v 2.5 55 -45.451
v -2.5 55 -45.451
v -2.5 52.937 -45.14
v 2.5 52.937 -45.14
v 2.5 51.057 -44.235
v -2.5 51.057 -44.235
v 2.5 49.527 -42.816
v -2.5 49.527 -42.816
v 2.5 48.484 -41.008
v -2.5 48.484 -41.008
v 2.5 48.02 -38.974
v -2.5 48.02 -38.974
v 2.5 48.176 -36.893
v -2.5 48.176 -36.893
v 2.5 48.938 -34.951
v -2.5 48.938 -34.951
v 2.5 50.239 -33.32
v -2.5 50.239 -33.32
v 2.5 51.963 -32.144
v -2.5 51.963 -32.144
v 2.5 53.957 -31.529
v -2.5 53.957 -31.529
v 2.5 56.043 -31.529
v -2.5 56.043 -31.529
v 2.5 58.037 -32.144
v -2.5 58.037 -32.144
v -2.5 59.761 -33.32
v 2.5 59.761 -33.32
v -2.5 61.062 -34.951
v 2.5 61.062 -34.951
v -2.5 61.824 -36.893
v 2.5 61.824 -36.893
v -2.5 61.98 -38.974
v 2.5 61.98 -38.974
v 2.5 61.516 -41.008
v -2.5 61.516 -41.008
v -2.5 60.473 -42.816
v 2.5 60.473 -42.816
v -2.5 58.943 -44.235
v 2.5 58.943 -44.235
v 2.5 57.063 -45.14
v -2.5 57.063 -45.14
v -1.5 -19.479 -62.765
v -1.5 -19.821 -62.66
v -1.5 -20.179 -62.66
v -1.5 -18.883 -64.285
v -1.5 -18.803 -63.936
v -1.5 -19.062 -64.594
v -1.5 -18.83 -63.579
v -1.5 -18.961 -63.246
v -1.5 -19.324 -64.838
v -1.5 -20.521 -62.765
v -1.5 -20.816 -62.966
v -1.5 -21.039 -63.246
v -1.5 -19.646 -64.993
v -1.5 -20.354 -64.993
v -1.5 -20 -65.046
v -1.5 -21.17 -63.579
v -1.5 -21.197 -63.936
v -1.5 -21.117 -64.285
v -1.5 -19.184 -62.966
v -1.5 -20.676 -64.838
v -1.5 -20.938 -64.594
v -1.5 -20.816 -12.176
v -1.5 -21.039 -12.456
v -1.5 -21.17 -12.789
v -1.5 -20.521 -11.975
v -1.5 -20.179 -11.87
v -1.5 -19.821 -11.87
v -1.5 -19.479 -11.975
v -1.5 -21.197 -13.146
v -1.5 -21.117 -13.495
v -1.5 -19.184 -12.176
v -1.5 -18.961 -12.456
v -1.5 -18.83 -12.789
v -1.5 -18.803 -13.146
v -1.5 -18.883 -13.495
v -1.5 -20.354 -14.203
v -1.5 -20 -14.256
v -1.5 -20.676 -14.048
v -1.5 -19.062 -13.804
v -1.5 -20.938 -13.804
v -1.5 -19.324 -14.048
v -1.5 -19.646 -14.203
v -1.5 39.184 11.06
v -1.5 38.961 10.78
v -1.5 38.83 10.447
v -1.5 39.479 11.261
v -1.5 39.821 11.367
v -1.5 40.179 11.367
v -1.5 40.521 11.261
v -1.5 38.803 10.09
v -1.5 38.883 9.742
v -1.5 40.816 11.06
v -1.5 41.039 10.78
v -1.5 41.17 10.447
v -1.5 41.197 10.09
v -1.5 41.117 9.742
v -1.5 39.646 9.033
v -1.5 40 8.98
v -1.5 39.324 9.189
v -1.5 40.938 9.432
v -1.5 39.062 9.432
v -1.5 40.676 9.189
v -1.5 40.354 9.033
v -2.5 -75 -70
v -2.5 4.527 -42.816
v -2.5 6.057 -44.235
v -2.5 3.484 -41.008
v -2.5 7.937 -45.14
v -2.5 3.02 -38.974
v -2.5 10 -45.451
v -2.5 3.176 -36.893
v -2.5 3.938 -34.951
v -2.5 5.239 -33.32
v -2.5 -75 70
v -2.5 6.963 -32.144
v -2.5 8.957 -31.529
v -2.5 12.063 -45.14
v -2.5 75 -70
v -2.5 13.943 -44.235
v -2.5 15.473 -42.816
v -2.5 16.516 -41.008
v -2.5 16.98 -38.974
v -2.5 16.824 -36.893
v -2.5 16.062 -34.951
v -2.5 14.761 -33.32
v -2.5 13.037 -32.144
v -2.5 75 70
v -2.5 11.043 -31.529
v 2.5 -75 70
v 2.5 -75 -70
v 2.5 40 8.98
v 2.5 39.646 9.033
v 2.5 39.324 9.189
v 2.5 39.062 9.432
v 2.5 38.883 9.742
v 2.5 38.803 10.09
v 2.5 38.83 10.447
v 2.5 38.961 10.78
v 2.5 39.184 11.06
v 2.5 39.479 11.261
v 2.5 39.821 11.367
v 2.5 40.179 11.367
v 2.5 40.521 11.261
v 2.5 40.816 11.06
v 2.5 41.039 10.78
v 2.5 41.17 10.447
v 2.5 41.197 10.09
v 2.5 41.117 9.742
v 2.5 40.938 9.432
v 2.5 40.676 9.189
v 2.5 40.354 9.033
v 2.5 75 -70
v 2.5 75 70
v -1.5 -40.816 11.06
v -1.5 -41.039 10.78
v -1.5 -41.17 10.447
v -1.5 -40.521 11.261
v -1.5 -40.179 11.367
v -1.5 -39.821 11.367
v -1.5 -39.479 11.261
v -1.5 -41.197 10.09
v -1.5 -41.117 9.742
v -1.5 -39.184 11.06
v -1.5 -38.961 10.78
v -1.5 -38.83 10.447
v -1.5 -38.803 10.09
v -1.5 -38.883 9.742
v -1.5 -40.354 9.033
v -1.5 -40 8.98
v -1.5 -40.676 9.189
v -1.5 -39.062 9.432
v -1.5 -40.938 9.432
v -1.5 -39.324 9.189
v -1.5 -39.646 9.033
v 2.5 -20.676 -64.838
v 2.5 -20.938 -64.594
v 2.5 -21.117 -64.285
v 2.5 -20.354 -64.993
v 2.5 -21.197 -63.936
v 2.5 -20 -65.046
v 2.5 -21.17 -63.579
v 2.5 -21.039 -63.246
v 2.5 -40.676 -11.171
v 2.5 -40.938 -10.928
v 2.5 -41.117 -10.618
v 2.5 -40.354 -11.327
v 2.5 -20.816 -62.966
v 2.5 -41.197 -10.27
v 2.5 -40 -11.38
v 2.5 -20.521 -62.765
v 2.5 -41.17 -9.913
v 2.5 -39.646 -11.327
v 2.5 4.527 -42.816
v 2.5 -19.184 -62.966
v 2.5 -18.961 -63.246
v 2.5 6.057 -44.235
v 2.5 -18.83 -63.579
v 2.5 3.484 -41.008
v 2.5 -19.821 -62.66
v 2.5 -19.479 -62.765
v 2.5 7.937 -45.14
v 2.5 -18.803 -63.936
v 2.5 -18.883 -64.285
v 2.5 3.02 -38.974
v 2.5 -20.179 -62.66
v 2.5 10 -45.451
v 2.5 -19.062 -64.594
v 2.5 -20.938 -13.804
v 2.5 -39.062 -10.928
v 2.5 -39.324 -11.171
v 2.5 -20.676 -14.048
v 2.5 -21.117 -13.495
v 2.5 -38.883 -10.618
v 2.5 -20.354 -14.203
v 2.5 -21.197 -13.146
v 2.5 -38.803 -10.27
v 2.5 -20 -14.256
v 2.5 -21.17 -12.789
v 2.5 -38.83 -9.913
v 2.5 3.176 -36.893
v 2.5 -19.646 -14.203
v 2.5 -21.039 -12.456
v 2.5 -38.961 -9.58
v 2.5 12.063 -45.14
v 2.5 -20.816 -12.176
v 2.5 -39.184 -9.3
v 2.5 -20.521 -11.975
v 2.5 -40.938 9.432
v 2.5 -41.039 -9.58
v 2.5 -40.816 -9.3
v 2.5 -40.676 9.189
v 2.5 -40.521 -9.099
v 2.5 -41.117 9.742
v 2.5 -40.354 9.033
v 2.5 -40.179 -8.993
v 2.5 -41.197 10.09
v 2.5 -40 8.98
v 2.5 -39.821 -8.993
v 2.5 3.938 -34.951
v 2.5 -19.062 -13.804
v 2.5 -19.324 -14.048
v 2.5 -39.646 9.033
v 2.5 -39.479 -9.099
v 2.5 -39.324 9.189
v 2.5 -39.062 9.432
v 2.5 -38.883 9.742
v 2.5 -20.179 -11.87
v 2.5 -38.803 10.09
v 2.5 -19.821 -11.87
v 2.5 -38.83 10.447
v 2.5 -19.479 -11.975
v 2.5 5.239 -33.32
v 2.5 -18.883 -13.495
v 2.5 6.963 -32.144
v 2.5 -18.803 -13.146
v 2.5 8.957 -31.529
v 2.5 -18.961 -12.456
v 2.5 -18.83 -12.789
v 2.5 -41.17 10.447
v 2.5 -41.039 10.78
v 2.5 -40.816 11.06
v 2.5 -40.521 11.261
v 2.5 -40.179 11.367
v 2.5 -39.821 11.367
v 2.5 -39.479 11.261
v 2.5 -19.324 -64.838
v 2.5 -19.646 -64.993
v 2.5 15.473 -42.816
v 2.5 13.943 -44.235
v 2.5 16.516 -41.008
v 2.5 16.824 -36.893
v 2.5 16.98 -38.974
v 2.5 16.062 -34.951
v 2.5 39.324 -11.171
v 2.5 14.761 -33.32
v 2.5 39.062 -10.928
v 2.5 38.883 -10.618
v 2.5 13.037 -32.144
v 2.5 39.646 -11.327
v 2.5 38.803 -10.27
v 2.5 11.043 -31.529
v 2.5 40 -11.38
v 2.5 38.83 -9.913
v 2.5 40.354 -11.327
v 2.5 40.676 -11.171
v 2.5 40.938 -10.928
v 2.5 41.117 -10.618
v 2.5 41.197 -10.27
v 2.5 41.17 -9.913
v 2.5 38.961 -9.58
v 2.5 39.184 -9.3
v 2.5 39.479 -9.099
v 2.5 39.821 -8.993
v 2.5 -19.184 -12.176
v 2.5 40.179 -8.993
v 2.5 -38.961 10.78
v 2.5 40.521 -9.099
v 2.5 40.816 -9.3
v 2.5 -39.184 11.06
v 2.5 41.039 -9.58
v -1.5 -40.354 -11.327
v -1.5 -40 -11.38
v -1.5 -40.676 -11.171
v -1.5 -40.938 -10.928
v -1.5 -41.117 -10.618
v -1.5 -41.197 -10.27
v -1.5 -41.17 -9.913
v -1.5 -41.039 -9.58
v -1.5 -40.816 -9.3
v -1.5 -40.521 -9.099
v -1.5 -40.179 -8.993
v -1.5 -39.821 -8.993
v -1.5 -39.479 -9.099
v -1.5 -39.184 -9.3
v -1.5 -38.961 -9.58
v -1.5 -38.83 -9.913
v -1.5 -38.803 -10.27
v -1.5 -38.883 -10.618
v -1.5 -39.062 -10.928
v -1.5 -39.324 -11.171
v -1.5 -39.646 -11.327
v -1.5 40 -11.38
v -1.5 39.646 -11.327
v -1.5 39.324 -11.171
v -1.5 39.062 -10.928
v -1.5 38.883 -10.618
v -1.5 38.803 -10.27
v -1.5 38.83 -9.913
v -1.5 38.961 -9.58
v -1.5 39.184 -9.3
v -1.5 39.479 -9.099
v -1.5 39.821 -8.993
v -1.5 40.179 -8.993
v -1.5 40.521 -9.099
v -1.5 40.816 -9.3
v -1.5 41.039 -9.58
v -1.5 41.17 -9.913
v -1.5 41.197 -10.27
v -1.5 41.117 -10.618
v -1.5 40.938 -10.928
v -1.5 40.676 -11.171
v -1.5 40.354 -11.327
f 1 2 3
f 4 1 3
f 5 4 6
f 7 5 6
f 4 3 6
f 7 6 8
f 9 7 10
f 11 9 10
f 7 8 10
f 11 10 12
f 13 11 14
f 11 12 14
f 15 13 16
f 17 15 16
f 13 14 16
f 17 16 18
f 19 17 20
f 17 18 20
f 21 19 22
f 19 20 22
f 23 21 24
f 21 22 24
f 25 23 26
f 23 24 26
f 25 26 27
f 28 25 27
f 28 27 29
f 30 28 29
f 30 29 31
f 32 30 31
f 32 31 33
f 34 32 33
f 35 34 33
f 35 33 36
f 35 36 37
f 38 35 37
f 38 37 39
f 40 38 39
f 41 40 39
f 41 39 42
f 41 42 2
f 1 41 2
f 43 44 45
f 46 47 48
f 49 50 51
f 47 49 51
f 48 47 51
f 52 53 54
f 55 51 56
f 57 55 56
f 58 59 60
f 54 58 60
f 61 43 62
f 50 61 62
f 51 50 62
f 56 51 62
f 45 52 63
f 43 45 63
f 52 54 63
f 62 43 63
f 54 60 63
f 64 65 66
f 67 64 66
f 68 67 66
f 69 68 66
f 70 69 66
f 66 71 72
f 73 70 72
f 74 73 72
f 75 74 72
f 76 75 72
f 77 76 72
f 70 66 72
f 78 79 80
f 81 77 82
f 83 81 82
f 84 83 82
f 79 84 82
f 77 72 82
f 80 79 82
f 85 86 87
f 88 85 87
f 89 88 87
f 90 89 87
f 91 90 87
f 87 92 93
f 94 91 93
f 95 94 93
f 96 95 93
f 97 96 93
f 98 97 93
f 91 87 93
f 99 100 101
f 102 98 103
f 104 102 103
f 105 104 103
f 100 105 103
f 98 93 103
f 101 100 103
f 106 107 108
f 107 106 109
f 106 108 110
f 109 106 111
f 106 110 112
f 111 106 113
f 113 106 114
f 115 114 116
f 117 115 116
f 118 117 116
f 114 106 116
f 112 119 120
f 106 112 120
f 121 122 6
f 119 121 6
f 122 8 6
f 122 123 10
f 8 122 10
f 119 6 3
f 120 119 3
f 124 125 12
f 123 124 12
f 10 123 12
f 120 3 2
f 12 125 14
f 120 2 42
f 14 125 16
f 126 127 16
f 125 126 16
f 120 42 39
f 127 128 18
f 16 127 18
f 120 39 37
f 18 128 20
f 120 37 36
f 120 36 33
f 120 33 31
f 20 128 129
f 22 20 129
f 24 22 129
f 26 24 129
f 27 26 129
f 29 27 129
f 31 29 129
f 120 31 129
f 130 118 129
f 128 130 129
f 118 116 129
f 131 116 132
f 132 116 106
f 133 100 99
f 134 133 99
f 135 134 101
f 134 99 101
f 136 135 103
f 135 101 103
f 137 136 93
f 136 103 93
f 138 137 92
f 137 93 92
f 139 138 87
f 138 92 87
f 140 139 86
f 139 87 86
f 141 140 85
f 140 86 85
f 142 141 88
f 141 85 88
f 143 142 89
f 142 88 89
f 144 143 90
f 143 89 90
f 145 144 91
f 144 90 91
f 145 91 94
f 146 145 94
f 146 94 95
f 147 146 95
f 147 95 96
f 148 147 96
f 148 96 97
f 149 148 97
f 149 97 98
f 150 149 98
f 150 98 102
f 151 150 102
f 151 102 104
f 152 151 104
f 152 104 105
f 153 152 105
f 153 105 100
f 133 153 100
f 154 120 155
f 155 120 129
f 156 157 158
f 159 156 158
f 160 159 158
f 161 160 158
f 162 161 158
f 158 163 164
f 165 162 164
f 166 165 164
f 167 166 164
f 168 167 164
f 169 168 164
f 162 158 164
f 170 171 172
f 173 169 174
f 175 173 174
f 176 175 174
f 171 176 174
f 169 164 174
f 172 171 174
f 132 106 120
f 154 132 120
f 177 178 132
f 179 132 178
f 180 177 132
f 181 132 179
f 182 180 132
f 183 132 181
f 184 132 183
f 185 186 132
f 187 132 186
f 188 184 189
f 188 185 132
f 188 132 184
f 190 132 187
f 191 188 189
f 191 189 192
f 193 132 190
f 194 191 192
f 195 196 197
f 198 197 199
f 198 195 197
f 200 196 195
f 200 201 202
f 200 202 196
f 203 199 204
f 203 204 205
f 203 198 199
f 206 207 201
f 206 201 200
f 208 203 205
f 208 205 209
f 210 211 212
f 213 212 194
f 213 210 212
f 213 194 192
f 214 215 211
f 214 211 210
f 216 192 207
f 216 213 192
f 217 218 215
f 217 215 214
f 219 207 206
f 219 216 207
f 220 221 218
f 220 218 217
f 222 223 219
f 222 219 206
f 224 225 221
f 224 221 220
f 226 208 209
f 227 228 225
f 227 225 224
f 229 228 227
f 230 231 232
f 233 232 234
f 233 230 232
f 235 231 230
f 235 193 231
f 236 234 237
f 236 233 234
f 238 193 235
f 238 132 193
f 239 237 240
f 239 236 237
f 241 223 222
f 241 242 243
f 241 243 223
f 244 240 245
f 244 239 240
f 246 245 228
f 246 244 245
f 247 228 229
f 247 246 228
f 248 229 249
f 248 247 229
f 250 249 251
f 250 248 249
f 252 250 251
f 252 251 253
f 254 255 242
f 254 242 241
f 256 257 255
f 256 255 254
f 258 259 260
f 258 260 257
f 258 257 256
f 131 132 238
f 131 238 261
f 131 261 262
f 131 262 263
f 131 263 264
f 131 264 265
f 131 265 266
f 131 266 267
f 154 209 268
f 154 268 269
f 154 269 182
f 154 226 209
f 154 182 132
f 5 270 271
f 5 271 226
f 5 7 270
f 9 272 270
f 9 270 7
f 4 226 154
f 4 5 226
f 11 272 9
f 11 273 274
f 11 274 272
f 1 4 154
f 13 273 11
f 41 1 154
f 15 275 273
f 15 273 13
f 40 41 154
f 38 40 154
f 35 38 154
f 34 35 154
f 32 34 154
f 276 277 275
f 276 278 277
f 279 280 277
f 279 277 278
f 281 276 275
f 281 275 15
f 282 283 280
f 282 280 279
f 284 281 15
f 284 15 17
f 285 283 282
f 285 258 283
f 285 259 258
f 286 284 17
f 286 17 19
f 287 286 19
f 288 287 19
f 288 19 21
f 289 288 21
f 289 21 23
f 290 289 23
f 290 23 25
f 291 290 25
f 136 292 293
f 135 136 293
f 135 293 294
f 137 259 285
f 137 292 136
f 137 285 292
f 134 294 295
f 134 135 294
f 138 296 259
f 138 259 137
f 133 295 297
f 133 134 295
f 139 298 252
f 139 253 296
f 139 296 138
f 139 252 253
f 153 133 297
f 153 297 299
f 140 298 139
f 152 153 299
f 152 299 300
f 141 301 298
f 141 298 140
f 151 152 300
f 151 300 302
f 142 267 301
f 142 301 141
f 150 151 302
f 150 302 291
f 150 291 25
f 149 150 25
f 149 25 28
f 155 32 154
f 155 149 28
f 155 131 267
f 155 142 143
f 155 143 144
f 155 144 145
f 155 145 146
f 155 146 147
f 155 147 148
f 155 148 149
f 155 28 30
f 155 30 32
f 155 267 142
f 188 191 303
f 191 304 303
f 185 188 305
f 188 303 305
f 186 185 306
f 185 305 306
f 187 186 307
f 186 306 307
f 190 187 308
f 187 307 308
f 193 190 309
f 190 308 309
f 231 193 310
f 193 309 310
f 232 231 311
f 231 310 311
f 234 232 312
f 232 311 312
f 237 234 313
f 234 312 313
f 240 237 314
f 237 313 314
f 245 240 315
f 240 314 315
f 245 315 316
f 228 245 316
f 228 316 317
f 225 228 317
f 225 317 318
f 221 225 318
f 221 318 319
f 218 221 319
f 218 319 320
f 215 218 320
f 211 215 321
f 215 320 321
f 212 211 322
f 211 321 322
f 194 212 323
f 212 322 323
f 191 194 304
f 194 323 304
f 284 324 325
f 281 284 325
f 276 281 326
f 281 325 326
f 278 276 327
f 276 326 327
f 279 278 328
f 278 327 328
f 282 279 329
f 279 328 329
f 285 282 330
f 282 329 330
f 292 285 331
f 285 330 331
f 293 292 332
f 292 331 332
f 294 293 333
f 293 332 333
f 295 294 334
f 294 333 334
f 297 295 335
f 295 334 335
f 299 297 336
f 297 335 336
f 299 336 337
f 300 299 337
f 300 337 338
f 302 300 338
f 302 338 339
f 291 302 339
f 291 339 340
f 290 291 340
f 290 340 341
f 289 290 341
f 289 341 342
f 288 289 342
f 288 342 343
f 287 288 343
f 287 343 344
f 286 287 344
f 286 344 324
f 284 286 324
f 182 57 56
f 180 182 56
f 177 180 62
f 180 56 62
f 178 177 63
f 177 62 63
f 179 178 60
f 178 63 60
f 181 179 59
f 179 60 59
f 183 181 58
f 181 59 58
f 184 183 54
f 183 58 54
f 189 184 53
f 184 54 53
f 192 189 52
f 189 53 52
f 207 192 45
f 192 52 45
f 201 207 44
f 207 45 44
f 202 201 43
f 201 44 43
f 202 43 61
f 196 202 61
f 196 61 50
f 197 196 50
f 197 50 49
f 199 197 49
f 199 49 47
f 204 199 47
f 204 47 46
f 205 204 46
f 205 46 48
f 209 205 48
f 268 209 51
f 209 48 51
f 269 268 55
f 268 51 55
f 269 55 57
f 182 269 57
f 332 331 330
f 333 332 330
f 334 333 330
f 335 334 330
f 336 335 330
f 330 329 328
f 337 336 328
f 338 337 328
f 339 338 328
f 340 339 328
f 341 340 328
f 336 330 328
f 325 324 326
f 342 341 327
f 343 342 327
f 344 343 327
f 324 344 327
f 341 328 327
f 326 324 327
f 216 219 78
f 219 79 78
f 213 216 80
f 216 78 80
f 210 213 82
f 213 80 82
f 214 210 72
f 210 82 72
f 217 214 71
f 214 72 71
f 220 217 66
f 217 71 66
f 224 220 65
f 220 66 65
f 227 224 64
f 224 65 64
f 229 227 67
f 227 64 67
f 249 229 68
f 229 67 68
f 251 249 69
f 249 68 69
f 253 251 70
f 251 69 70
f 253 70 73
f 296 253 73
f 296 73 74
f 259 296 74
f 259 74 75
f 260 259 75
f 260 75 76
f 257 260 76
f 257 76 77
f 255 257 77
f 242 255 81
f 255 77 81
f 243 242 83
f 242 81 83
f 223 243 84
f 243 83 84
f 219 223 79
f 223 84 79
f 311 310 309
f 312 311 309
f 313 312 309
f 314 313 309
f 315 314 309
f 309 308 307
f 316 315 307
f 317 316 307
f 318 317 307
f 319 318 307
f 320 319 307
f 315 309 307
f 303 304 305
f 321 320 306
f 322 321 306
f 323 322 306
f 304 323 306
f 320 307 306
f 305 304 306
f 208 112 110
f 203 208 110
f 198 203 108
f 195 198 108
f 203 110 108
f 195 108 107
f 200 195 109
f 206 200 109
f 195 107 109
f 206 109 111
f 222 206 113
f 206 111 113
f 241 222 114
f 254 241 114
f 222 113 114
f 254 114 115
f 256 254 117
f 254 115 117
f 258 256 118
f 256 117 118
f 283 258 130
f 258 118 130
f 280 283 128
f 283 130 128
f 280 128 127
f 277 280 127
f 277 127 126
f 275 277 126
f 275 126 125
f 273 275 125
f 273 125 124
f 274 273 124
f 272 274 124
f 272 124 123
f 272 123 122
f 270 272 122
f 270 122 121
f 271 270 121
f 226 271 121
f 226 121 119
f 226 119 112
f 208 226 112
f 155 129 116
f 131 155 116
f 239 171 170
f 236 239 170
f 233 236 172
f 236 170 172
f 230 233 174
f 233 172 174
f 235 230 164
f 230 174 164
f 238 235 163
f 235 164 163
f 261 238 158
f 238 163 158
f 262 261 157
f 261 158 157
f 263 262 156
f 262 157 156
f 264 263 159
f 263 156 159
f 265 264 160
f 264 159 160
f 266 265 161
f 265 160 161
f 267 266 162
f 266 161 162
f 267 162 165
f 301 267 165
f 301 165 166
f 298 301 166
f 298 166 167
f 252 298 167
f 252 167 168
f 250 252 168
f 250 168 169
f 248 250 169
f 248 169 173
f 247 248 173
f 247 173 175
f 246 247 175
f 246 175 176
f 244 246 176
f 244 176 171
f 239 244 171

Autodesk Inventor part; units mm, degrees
ref_plane "YZ Plane" through (0, 0, 0) normal (1, 0, 0) x (0, 1, 0)
ref_plane "XZ Plane" through (0, 0, 0) normal (0, 1, 0) x (-1, 0, 0)
ref_plane "XY Plane" through (0, 0, 0) normal (0, 0, 1) x (1, 0, 0)
sketch "Sketch1" plane through (0, 0, 0) normal (1, 0, 0) x (0, 1, 0)
  line L0 (75, 70) -> (-75, 70)
  line L1 (-75, 70) -> (-75, -70)
  line L2 (-75, -70) -> (75, -70)
  line L3 (75, -70) -> (75, 70)
  point P0 (0, 0)
  point P1 (75, 0)
  point P2 (0, 70)
  dimension "d0" = 140
  dimension "d1" = 150
extrude "Extrusion1" add sketch "Sketch1" along normal mid plane 5
sketch "Sketch2" plane through (2.5, 0, 0) normal (1, 0, 0) x (0, 0, -1)
  line L0 (70, 75) -> (-70, 75) projected
  line L1 (-10.18, 40) -> (10.18, 40)
  point P0 (0, 0)
  point P1 (0, 40)
  dimension "d4" = 20.36
  dimension "d5" = 35
hole "Hole1" at (2.5, 40, 10.18) at (2.5, 40, -10.18) direction (-1, 0, 0) diameter 2.4 depth 4
pattern_linear "Rectangular Pattern1" count 2 spacing 80 along (0, -1, 0) of "Hole1"
sketch "Sketch3" plane through (2.5, 0, 0) normal (1, 0, 0) x (0, 0, -1)
  circle A0 centre (10.18, -40) radius 1.2 projected
  point P0 (0, 0)
  point P1 (13.0561, -20)
  point P2 (63.8461, -20)
  dimension "d16" = 50.79
  dimension "d19" = 20
  dimension "d20" = 13.0561
hole "Hole2" at (2.5, -20, -13.0561) at (2.5, -20, -63.8461) direction (-1, 0, 0) diameter 2.4 depth 4
sketch "Sketch4" plane through (2.5, 0, 0) normal (1, 0, 0) x (0, 0, -1)
  line L0 (70, 75) -> (-70, 75) projected
  circle A0 centre (13.0561, -20) radius 1.2 projected
  circle A1 centre (63.8461, -20) radius 1.2 projected
  line L1 (13.0561, -20) -> (63.8461, -20)
  point P0 (0, 0)
  point P1 (38.4511, 55)
  point P2 (38.4511, -20)
  point P3 (38.4511, 10)
  dimension "d28" = 20
  dimension "d29" = 45
hole "Hole3" at (2.5, 55, -38.4511) at (2.5, 10, -38.4511) direction (-1, 0, 0) diameter 14 depth 5
properties part number "Part_B9"
